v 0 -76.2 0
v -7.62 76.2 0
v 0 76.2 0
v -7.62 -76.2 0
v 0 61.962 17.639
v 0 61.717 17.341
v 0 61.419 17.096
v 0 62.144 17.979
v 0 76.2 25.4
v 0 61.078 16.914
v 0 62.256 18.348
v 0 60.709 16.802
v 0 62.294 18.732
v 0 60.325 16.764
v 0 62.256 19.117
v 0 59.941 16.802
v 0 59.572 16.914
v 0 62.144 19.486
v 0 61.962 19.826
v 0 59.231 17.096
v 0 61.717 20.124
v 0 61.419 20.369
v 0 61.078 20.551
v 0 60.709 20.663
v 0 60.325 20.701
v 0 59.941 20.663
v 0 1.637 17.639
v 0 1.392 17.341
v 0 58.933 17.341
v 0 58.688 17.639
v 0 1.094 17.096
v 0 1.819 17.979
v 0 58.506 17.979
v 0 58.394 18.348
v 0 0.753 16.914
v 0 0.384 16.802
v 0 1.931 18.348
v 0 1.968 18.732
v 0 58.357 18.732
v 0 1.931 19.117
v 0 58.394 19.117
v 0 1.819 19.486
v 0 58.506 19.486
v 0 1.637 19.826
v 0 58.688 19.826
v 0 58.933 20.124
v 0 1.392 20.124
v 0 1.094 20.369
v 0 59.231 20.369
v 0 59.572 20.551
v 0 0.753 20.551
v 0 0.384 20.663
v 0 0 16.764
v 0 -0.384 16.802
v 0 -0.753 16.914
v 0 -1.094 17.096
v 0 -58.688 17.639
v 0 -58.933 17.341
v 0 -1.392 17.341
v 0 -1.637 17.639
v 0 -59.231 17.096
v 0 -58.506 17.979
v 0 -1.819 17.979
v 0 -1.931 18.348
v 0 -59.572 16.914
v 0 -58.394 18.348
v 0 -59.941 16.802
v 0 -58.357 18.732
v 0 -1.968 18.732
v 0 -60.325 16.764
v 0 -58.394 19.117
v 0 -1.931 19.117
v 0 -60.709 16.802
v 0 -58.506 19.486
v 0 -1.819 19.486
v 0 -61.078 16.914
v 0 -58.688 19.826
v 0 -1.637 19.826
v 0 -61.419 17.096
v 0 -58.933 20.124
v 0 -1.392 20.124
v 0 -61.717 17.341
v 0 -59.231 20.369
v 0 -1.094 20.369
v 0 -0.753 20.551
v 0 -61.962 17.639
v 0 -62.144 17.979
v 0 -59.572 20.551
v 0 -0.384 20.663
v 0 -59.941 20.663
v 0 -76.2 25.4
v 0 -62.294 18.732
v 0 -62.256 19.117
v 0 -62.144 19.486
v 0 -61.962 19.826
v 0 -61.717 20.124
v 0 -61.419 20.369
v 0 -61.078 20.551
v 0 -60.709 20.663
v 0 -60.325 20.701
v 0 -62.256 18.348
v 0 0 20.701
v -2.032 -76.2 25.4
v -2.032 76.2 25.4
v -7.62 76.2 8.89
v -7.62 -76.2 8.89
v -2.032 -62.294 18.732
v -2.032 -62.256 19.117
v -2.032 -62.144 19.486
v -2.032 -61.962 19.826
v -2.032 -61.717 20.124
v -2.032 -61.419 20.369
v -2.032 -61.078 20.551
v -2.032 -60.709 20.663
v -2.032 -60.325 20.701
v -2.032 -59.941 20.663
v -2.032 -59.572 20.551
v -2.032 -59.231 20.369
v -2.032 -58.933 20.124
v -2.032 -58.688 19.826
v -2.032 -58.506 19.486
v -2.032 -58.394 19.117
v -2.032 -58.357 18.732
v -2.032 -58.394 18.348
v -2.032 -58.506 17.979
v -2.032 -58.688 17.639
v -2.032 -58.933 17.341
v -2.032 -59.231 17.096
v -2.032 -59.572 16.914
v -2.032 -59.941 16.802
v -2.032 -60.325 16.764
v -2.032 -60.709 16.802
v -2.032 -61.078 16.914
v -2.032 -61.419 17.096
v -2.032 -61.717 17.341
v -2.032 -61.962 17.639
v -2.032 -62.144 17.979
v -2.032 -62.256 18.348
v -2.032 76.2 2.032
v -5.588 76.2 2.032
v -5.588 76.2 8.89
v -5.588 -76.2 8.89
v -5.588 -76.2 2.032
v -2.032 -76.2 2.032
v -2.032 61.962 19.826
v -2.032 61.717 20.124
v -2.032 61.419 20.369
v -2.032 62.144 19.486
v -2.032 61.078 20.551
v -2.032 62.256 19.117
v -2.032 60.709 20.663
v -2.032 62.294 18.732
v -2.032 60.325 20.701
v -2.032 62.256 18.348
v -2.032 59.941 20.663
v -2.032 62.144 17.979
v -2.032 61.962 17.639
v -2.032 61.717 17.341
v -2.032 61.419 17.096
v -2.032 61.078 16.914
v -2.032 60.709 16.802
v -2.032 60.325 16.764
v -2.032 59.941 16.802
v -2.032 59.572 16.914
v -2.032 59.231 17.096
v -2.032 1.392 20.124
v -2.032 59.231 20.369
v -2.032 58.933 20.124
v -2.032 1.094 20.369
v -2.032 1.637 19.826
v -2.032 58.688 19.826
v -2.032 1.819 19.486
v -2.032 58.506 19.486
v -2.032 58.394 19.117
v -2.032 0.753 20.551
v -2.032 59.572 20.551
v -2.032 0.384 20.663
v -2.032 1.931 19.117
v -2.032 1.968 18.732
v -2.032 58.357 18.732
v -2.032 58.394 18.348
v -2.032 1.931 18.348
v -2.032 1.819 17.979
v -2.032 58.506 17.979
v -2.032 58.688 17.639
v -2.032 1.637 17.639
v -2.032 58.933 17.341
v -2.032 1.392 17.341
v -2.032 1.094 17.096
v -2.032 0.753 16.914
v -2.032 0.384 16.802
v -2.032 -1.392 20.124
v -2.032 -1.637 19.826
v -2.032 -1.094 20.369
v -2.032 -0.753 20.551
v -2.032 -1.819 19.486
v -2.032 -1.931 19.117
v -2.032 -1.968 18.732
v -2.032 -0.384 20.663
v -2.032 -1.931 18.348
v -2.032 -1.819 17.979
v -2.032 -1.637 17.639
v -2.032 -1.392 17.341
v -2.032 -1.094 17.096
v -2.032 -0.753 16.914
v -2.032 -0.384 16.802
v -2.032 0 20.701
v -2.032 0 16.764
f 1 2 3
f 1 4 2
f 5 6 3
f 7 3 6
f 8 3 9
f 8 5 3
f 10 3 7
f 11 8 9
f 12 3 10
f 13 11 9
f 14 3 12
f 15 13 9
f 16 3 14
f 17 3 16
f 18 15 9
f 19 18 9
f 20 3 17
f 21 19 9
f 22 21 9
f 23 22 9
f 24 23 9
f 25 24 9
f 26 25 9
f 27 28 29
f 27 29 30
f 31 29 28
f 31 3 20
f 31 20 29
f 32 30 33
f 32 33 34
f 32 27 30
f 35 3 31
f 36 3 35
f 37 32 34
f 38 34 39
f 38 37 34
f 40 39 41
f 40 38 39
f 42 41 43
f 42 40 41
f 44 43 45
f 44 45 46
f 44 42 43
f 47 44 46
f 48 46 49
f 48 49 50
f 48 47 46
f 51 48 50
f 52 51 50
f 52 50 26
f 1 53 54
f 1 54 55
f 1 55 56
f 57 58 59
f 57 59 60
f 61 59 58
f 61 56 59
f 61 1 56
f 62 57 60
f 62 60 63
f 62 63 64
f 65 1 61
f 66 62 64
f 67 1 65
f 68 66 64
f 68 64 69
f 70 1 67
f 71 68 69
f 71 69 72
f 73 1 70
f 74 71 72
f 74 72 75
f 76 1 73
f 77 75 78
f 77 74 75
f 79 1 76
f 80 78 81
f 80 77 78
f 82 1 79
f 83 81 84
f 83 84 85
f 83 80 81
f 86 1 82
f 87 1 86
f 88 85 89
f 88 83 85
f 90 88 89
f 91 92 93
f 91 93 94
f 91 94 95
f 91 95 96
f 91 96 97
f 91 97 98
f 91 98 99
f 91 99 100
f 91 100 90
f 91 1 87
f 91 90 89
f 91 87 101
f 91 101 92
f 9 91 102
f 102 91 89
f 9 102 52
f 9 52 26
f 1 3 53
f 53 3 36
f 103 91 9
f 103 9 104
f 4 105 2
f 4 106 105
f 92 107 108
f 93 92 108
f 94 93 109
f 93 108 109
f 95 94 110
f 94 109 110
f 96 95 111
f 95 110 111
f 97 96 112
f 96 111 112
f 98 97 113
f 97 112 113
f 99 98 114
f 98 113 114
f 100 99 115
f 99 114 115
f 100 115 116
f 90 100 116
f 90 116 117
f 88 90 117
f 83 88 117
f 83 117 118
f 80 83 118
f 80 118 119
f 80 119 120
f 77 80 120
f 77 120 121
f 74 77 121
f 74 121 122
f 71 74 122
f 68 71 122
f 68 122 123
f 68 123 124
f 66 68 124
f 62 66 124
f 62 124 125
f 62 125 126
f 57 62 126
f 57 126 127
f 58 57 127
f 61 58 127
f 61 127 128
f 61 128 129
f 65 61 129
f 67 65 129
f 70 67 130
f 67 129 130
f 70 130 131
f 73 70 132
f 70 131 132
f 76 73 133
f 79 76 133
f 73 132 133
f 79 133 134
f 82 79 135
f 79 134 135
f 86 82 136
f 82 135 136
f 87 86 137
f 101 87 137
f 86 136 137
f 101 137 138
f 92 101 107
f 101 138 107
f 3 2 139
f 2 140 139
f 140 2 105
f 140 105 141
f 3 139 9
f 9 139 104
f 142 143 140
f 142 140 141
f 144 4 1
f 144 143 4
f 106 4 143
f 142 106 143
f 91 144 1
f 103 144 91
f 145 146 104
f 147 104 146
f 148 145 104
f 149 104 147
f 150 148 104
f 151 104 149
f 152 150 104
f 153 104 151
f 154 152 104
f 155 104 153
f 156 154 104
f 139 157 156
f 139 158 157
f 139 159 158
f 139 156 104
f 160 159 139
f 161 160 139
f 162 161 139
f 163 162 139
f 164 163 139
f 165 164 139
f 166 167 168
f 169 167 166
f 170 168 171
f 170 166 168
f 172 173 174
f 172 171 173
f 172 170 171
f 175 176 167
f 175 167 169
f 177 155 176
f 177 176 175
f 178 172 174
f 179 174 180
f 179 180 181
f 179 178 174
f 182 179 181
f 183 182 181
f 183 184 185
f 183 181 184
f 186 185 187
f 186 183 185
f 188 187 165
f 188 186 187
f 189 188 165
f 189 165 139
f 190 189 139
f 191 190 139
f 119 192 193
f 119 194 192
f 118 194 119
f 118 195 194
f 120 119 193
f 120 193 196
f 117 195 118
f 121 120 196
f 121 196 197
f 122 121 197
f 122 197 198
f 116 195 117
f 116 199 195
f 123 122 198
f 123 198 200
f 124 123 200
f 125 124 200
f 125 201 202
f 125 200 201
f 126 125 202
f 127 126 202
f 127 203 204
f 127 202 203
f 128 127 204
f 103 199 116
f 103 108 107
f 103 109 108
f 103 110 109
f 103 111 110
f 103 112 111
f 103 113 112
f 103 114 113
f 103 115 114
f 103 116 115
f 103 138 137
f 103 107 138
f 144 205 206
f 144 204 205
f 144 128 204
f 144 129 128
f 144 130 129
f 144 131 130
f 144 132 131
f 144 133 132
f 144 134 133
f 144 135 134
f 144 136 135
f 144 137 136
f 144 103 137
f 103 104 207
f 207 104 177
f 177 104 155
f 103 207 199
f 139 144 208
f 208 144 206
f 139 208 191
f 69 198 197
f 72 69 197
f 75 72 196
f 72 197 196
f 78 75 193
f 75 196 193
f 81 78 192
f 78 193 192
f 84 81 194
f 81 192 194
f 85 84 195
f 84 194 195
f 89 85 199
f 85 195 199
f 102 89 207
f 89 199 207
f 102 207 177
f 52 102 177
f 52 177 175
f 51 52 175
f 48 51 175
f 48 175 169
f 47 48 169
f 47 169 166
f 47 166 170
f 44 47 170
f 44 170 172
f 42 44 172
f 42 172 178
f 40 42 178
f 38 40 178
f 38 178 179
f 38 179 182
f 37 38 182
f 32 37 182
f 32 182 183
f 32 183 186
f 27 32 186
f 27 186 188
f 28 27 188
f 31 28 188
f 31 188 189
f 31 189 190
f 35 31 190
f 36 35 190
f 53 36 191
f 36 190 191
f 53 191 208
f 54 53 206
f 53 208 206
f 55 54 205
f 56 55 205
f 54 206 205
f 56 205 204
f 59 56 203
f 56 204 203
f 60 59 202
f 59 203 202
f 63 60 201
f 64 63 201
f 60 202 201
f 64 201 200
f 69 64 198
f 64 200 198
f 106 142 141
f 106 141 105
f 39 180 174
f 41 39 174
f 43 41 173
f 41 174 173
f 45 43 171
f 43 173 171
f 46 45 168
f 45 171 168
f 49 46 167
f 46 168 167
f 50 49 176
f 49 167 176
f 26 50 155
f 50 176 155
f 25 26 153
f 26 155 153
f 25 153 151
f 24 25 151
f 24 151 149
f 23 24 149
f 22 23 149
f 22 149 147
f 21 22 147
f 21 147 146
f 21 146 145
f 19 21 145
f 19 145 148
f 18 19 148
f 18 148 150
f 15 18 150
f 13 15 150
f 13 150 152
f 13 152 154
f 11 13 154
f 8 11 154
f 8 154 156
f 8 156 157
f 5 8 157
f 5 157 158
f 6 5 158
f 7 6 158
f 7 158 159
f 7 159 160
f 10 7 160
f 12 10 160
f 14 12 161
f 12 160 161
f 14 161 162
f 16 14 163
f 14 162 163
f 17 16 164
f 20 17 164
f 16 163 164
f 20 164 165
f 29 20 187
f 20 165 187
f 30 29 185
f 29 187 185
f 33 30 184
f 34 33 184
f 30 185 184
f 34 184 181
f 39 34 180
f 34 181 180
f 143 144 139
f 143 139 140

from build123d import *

# Parameters (mm, degrees)
F1_DEPTH = 76.2
F2_R     = 1.9685
F3_DEPTH = 2.033


with BuildPart() as f1:
    # F0 (on Front) → F1 (new body, symmetric)
    with BuildSketch(Plane.XZ):
        Polygon((0, 0), (0, 25.4), (-2.032, 25.4), (-2.032, 2.032), (-5.588, 2.032), (-5.588, 8.89), (-7.62, 8.89), (-7.62, 0), align=None)
    extrude(amount=F1_DEPTH, both=True)

    # F2 (on face) → F3 (cut, through all)
    with BuildSketch(Plane(origin=(-2.032, 0, 0), x_dir=(0, -1, 0), z_dir=(-1, 0, 0))):
        with Locations((-60.325, 18.7325)):
            Circle(F2_R)
        with Locations((0, 18.7325)):
            Circle(F2_R)
        with Locations((60.325, 18.7325)):
            Circle(F2_R)
    extrude(amount=-F3_DEPTH, mode=Mode.SUBTRACT)


solid = f1.part
